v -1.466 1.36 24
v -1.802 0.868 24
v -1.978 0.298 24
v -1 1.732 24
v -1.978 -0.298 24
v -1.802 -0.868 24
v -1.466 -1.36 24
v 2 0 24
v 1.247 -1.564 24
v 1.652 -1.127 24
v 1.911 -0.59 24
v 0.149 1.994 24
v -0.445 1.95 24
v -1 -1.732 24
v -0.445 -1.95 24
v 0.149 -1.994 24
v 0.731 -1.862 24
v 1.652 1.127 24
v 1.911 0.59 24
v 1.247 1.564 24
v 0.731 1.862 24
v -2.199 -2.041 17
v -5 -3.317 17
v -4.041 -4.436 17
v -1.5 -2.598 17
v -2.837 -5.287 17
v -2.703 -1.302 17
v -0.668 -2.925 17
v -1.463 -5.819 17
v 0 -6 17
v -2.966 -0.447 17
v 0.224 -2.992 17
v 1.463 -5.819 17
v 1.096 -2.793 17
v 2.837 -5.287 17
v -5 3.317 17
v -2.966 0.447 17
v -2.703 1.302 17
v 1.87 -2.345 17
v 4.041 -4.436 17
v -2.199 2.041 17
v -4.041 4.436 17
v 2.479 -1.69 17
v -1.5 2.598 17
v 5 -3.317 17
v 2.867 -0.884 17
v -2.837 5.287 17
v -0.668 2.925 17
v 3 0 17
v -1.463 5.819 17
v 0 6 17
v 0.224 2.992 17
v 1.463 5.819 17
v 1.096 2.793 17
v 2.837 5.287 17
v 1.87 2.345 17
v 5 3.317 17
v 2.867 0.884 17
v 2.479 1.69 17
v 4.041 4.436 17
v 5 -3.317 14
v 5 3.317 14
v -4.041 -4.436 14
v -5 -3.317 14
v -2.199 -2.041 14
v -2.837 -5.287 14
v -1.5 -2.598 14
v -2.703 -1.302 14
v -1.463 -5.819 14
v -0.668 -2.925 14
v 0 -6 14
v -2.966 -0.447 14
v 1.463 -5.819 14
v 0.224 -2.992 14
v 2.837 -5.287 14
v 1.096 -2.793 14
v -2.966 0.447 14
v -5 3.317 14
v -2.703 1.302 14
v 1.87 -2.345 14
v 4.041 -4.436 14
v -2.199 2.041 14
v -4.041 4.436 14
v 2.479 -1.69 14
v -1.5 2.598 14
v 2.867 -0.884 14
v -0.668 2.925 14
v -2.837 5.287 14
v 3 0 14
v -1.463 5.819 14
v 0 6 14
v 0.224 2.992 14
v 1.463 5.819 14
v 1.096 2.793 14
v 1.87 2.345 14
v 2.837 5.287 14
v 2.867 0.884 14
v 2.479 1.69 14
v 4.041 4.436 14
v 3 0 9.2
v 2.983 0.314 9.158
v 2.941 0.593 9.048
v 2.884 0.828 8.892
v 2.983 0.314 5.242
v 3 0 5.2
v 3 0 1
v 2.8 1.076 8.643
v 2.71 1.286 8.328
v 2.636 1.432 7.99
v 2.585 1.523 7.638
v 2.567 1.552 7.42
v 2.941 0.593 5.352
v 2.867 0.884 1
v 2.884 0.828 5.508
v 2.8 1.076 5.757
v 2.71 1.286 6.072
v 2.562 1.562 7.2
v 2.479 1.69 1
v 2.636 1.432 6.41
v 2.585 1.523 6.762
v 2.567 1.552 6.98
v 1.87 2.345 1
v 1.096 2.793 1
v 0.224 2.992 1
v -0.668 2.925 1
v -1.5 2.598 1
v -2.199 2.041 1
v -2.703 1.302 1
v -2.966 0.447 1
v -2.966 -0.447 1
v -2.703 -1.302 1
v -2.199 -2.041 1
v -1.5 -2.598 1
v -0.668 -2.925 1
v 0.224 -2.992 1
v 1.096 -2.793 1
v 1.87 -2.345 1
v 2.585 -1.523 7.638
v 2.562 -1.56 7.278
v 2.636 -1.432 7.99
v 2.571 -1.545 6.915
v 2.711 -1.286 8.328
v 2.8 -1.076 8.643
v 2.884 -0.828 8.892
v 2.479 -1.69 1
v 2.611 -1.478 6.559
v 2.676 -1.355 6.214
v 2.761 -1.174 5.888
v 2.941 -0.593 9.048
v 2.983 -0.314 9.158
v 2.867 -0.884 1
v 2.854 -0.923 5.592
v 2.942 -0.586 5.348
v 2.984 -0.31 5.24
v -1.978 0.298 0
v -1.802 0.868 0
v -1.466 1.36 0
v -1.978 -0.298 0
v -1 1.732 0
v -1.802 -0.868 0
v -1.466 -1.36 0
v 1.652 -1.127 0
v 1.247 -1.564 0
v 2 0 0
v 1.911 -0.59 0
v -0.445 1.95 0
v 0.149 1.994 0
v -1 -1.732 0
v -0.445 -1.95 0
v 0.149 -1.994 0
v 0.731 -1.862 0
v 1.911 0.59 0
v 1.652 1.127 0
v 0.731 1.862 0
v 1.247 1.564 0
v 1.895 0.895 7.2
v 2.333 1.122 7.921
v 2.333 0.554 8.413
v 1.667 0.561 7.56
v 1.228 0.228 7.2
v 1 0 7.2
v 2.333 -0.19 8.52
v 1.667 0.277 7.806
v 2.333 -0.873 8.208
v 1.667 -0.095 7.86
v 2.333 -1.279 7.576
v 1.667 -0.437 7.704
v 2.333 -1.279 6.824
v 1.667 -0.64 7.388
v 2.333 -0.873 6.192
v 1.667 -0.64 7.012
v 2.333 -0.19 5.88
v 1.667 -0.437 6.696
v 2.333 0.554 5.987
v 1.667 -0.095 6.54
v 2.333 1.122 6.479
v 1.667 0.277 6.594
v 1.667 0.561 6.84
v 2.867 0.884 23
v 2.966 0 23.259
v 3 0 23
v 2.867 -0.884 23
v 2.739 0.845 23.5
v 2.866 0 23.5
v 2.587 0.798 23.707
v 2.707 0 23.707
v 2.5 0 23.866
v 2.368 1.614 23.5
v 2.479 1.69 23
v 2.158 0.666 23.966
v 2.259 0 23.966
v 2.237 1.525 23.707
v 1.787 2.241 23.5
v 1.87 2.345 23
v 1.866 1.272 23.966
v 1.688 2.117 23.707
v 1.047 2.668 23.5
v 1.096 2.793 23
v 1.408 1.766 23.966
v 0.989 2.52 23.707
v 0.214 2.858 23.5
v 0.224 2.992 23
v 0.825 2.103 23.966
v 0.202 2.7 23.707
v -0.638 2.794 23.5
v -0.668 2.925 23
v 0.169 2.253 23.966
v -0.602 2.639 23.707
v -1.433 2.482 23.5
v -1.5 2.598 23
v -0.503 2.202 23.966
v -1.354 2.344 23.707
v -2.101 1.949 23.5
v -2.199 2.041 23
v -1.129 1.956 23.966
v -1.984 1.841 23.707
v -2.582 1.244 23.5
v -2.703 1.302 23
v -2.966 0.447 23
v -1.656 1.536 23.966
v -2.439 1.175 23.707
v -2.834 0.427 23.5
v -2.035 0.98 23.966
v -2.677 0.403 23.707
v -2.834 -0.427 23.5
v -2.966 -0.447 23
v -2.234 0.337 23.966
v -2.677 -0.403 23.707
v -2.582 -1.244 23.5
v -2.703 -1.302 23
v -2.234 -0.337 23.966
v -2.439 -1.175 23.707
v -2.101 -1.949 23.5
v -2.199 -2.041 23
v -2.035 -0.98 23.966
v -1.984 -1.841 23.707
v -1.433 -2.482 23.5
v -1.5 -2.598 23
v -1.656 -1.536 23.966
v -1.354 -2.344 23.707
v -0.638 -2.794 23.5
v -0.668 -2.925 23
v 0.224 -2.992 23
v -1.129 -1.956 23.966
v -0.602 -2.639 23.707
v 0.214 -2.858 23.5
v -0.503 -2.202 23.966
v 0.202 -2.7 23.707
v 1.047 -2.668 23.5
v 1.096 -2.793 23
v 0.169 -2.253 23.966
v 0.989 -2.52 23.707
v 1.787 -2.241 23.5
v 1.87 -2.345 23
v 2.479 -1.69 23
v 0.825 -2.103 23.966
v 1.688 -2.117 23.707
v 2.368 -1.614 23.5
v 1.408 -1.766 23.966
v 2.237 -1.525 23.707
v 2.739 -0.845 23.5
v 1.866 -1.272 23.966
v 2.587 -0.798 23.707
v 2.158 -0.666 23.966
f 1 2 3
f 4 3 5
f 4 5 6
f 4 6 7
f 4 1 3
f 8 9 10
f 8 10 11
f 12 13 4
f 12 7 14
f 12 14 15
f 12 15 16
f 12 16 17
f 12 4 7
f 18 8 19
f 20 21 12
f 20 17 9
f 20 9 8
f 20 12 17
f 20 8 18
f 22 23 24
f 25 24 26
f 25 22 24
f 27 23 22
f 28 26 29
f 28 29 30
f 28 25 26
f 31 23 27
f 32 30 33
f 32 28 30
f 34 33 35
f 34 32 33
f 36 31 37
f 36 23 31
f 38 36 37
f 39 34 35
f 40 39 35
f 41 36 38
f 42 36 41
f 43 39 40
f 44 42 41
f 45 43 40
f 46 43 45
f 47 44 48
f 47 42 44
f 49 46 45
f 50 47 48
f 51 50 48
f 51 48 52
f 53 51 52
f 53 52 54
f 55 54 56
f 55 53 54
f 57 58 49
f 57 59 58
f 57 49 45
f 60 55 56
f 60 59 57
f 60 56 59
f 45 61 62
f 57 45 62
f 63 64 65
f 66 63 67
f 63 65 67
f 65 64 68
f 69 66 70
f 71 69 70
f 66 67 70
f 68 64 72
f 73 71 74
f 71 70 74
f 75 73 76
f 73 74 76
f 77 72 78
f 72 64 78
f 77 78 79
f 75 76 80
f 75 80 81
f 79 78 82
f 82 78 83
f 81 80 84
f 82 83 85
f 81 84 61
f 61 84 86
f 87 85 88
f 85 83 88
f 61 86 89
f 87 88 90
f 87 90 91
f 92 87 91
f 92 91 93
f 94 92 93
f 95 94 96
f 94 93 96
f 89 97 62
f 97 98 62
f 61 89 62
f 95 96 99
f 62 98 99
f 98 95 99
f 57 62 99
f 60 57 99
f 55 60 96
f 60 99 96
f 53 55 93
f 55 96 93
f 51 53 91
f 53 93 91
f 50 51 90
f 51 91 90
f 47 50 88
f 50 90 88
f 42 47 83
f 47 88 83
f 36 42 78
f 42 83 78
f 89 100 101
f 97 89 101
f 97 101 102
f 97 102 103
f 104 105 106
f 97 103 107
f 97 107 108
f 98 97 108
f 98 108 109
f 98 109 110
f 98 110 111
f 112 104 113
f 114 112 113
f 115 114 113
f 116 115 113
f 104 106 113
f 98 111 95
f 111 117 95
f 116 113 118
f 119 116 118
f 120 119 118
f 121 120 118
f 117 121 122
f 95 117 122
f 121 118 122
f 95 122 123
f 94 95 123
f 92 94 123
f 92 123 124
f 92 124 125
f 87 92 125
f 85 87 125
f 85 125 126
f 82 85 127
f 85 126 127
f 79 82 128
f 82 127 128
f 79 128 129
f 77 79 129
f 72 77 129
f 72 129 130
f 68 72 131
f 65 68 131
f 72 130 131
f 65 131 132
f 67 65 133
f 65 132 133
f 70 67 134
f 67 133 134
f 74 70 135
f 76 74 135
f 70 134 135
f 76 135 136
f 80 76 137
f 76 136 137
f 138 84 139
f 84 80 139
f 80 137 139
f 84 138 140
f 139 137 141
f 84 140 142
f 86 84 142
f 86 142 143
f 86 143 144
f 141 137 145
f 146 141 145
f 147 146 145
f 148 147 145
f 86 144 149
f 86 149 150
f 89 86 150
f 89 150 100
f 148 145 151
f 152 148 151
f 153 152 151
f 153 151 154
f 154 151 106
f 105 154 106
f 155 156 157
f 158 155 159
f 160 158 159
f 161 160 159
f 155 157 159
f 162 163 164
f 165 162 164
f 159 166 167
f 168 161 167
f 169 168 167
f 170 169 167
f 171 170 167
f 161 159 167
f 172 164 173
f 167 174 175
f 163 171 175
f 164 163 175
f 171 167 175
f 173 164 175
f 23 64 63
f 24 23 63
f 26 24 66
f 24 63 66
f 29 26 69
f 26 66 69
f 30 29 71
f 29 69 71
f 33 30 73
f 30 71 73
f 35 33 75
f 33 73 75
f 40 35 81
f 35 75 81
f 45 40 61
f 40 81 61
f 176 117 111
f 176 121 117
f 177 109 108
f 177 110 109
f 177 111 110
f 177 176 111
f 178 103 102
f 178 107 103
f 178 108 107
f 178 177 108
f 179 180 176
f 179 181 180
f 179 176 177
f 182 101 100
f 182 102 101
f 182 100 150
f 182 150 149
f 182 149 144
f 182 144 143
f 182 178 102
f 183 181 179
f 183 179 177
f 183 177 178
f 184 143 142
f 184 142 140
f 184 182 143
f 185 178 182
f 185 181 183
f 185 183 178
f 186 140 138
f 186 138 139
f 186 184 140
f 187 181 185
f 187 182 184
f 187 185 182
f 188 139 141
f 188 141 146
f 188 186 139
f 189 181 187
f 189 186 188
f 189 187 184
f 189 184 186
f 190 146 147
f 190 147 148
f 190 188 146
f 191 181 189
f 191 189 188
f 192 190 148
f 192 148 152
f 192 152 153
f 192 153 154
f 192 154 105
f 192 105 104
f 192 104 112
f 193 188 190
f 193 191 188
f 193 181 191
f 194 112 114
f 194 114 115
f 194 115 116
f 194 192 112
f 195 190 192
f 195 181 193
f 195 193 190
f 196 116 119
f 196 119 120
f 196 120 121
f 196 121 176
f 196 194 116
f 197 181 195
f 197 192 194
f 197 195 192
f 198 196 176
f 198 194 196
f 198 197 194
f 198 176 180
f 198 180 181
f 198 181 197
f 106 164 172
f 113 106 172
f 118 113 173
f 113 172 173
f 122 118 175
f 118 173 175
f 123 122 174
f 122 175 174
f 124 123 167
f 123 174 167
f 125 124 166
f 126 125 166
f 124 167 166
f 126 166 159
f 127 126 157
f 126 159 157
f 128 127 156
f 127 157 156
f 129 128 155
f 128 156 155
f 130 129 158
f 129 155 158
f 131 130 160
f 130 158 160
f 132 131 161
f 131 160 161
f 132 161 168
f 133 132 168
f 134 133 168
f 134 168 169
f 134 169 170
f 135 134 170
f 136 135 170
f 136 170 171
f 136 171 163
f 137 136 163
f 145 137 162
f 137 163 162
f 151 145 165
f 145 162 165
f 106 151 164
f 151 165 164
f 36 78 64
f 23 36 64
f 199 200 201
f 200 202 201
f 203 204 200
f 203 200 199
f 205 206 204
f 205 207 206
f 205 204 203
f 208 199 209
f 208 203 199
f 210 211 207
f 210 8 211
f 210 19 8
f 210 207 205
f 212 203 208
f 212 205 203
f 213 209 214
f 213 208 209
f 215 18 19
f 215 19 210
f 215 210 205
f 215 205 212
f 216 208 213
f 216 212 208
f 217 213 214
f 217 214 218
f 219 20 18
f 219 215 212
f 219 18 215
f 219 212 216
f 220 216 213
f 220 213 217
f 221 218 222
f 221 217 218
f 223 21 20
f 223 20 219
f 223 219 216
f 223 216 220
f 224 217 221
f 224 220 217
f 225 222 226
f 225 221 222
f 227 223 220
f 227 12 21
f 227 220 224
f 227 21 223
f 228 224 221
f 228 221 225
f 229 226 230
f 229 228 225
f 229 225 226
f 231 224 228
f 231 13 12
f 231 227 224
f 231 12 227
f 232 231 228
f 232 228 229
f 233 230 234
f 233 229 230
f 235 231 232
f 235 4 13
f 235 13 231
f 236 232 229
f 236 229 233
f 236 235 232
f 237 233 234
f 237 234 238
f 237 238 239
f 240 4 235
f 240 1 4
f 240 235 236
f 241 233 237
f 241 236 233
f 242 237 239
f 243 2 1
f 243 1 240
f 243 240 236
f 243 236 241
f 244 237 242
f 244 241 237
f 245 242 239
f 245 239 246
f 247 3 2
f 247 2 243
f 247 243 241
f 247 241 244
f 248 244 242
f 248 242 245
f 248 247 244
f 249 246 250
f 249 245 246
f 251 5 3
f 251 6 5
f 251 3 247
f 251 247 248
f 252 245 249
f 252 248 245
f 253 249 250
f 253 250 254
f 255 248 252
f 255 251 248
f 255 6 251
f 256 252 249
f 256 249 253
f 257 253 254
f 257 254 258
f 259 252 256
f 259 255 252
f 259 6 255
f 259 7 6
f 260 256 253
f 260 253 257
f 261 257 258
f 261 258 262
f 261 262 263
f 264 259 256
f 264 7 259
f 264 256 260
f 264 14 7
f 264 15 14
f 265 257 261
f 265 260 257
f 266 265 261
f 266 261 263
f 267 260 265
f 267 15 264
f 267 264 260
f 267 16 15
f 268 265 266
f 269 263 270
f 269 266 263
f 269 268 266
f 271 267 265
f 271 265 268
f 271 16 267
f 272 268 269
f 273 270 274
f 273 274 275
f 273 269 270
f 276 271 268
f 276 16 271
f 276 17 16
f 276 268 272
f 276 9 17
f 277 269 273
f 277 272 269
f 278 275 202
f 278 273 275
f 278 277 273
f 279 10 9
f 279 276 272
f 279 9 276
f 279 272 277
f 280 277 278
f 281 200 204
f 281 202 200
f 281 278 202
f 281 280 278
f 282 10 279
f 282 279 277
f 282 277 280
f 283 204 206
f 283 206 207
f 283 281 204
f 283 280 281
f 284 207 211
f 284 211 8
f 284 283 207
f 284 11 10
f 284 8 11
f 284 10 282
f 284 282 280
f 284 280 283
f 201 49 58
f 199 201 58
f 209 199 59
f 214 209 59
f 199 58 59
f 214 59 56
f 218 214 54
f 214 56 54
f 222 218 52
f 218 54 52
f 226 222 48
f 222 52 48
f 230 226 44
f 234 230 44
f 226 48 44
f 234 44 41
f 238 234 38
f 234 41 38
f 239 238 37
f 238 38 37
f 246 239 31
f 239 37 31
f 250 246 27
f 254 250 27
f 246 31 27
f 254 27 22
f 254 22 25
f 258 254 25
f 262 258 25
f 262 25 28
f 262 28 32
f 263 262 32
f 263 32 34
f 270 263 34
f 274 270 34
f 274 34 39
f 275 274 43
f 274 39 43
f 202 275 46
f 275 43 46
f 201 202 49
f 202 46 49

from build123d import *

# Parameters (mm, degrees)
F0_R     = 3
F1_DEPTH = 14
F3_DEPTH = 3
F4_R     = 3
F5_DEPTH = 7
F6_R     = 1
F8_R     = 2
F10_SIZE = 1


# Not quite as in the source:
# - an extrude whose draft closes it to a point is written as a loft to that point


with BuildPart() as f1:
    # F0 (on Top) → F1 (new body)
    with BuildSketch(Plane.XY):
        Circle(F0_R)
    extrude(amount=F1_DEPTH)

    # F2 (on face) → F3 (join)
    with BuildSketch(Plane.XY.offset(14)):
        with BuildLine():
            Line((-5, 3.3166247904), (-5, -3.3166247904))
            ThreePointArc((-5, -3.3166247904), (0, -6), (5, -3.3166247904))
            Line((5, -3.3166247904), (5, 3.3166247904))
            ThreePointArc((5, 3.3166247904), (0, 6), (-5, 3.3166247904))
        make_face()
    extrude(amount=F3_DEPTH)

    # F4 (on face) → F5 (join)
    with BuildSketch(Plane.XY.offset(17)):
        Circle(F4_R)
    extrude(amount=F5_DEPTH)

    # F6
    f6_edges = [f1.edges().sort_by_distance(p)[0] for p in [
        (-3, 0, 24),
    ]]
    fillet(f6_edges, radius=F6_R)

    # F8 (on offset) → F9 section 0
    with BuildSketch(Plane.YZ.offset(3), mode=Mode.PRIVATE) as f9_s0:
        with Locations((0, 7.2)):
            Circle(F8_R)
    loft([f9_s0.sketch, Vertex(1, 0, 7.2)], ruled=True, mode=Mode.SUBTRACT)

    # F10
    f10_edges = [f1.edges().sort_by_distance(p)[0] for p in [
        (-3, 0, 0),
    ]]
    chamfer(f10_edges, length=F10_SIZE)


solid = f1.part
